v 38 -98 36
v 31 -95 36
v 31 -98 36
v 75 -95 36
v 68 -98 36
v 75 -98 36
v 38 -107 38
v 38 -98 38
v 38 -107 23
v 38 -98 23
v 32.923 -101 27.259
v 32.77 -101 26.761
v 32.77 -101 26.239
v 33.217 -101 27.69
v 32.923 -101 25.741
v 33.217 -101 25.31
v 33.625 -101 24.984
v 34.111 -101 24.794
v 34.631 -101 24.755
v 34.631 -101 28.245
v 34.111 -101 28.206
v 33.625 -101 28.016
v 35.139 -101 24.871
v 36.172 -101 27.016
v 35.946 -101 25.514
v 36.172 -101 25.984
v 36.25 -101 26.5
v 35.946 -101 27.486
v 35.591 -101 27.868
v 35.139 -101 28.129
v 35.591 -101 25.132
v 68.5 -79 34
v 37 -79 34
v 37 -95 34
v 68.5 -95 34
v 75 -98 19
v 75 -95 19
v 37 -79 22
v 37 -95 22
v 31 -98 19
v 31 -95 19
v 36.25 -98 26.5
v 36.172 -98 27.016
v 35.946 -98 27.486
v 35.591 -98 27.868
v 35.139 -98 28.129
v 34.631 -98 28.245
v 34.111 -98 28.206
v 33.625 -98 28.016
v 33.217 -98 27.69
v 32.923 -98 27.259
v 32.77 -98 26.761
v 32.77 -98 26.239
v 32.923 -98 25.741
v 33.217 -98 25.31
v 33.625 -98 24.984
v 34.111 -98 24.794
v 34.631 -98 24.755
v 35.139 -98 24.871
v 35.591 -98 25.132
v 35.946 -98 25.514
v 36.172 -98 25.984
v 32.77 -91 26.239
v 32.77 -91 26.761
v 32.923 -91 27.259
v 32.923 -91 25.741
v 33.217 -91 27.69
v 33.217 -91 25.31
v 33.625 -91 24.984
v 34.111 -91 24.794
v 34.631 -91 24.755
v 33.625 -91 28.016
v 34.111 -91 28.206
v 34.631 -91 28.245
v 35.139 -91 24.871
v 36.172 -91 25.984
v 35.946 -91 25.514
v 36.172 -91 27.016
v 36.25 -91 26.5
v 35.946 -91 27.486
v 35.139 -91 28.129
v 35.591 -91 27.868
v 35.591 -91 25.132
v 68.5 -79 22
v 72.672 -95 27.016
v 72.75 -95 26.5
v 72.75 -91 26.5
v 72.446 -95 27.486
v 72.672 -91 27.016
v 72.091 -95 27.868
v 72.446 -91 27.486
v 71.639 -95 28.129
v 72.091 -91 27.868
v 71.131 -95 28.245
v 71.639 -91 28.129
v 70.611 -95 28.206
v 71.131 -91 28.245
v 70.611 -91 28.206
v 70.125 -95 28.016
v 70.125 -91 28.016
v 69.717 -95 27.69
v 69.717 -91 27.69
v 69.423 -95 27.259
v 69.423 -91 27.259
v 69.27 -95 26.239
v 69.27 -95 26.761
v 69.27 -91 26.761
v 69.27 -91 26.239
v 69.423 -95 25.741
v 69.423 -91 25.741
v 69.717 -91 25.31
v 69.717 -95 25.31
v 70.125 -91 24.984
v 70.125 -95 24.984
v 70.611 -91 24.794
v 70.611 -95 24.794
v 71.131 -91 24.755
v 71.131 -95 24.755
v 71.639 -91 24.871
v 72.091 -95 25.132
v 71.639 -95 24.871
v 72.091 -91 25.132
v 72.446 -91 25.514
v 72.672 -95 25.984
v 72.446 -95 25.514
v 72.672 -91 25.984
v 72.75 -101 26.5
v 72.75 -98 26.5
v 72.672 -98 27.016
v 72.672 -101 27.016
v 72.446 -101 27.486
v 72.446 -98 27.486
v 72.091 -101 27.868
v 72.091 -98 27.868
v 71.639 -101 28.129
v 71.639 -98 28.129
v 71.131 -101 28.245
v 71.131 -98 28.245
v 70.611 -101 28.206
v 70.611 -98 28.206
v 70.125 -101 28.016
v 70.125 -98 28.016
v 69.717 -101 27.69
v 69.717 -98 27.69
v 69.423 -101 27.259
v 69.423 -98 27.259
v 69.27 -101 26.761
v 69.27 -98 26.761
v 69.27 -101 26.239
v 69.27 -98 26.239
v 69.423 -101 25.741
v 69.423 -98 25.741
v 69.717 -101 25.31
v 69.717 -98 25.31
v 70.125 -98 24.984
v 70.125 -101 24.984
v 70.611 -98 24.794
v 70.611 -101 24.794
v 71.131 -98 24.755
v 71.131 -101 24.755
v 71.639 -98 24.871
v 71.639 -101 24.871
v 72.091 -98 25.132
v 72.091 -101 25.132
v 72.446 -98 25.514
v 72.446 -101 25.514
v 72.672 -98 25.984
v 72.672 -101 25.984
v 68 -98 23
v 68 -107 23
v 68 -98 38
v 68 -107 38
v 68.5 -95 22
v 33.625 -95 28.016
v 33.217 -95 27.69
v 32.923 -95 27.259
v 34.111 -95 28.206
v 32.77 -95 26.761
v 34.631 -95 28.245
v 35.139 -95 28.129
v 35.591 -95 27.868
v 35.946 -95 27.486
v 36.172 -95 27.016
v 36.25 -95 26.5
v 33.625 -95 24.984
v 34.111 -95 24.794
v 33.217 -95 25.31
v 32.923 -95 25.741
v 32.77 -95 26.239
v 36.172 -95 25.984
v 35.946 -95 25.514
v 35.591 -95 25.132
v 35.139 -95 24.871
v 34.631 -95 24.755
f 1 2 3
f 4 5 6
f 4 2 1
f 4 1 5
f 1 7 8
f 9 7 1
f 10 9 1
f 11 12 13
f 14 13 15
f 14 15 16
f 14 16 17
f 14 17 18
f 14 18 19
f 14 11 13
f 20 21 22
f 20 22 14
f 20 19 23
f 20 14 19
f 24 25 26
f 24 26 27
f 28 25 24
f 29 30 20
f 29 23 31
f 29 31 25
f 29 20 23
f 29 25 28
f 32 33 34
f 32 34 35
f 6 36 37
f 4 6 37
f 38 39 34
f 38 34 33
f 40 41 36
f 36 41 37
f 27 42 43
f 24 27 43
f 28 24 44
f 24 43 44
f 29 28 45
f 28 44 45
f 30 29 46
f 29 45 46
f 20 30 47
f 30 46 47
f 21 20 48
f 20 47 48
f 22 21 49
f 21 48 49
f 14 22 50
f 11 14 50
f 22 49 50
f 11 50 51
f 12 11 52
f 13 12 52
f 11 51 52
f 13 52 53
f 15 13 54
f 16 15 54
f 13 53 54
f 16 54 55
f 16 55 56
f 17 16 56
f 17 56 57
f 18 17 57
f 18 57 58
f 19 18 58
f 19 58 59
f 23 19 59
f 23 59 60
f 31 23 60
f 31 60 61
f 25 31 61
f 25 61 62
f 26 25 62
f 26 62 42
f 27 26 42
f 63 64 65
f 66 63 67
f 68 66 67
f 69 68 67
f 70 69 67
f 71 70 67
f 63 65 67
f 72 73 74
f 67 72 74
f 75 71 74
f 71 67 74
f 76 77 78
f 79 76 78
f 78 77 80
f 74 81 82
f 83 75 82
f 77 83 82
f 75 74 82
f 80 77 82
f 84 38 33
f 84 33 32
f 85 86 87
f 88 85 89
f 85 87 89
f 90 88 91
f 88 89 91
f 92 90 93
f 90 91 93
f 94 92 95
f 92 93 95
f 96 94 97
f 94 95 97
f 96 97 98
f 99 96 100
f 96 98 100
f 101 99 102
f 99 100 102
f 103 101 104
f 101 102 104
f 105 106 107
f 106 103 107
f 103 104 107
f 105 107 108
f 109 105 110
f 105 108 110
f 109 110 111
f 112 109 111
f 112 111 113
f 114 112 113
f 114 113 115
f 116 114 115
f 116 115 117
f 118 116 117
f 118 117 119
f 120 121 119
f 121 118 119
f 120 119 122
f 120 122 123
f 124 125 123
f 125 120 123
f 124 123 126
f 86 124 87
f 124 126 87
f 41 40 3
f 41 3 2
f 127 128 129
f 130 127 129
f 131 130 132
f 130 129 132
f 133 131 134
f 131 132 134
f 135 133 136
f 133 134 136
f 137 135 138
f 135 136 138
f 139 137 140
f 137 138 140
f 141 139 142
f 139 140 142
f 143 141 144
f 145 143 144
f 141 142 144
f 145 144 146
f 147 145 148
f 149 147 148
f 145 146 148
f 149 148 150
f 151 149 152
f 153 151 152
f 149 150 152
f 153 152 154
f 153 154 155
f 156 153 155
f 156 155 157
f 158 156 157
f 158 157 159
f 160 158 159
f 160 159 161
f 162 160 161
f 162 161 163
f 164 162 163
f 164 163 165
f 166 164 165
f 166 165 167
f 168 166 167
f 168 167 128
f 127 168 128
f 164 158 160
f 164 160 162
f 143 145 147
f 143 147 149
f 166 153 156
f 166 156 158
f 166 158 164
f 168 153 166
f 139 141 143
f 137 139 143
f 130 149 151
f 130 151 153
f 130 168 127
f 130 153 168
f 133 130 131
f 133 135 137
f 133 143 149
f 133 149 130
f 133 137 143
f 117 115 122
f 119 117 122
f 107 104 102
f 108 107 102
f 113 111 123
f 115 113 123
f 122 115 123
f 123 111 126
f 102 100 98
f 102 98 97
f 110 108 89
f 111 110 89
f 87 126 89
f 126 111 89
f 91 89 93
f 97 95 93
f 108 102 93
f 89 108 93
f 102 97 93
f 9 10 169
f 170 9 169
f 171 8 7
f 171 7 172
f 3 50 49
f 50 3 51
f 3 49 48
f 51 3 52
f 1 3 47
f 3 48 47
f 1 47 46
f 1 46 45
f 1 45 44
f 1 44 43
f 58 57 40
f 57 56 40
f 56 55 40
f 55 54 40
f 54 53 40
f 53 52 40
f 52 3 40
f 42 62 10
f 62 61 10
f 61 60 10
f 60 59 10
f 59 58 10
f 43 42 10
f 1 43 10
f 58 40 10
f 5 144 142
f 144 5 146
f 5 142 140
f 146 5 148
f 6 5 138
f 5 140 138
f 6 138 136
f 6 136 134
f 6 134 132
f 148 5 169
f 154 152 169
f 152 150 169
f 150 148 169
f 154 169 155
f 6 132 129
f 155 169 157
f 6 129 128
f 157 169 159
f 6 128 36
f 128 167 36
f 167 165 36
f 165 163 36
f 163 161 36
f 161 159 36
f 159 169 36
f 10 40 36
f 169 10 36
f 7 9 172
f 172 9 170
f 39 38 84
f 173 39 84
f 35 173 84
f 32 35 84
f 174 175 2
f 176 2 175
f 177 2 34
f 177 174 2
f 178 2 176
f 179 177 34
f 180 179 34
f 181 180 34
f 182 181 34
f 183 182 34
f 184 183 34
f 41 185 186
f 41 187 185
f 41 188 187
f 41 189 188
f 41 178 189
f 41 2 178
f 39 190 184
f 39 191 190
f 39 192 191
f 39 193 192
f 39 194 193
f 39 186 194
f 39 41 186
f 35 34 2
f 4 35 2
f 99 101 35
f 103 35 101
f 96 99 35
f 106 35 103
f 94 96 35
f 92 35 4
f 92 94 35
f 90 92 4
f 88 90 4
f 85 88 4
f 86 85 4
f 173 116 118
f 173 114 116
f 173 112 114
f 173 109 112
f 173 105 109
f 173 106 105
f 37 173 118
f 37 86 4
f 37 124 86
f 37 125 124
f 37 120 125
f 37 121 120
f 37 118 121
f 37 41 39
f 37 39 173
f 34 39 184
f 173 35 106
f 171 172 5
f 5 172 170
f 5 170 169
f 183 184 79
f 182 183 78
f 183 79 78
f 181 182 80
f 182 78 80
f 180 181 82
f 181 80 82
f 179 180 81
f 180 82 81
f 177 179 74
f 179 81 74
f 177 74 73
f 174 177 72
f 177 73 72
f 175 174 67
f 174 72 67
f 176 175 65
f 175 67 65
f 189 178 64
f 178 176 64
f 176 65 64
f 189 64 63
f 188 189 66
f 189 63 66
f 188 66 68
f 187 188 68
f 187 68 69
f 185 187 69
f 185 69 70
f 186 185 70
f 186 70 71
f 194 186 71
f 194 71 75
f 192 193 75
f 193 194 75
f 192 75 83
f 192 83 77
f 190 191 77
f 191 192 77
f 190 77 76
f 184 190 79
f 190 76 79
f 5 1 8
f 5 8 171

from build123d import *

# Parameters (mm, degrees)
BOX010_W          = 30
BOX010_H          = 9
BOX010_DEPTH      = 15
BOX011_W          = 31.5
BOX011_H          = 16
BOX011_DEPTH      = 12
CYLINDER_R        = 1.75
CYLINDER_DEPTH    = 10
CYLINDER001_R     = 1.75
CYLINDER001_DEPTH = 10
BOX009_W          = 44
BOX009_H          = 3
BOX009_DEPTH      = 17


with BuildPart() as cube010:
    # Box010 → Box010 (new body)
    with BuildSketch(Plane(origin=(43, -107, 23), x_dir=(1, 0, 0), z_dir=(0, 0, 1))):
        with Locations((15, 4.5)):
            Rectangle(BOX010_W, BOX010_H)
    extrude(amount=BOX010_DEPTH)


with BuildPart() as cube011:
    # Box011 → Box011 (new body)
    with BuildSketch(Plane(origin=(42, -95, 22), x_dir=(1, 0, 0), z_dir=(0, 0, 1))):
        with Locations((15.75, 8)):
            Rectangle(BOX011_W, BOX011_H)
    extrude(amount=BOX011_DEPTH)


with BuildPart() as cylinder:
    # Cylinder → Cylinder (new body)
    with BuildSketch(Plane(origin=(40, -91, 26.5), x_dir=(1, 0, 0), z_dir=(0, -1, 0))):
        Circle(CYLINDER_R)
    extrude(amount=CYLINDER_DEPTH)


with BuildPart() as fusion003:
    # Cylinder001 → Cylinder001 (new body)
    with BuildSketch(Plane(origin=(76.5, -91, 26.5), x_dir=(1, 0, 0), z_dir=(0, -1, 0))):
        Circle(CYLINDER001_R)
    extrude(amount=CYLINDER001_DEPTH)

    # Fusion003: union Cylinder
    add(cylinder.part)


with BuildPart() as fusion003_1:
    # Fusion003 placement: moved
    add(fusion003.part.moved(Location((-0.5, 0, 0))))


with BuildPart() as f_4p:
    # Box009 → Box009 (new body)
    with BuildSketch(Plane(origin=(36, -98, 19), x_dir=(1, 0, 0), z_dir=(0, 0, 1))):
        with Locations((22, 1.5)):
            Rectangle(BOX009_W, BOX009_H)
    extrude(amount=BOX009_DEPTH)

    # Fusion004: union Cube010, Cube011, Fusion003
    add(cube010.part)
    add(cube011.part)
    add(fusion003_1.part)


with BuildPart() as f_4p_1:
    # Fusion004 placement: moved
    add(f_4p.part.moved(Location((-5, 0, 0))))


solid = f_4p_1.part
